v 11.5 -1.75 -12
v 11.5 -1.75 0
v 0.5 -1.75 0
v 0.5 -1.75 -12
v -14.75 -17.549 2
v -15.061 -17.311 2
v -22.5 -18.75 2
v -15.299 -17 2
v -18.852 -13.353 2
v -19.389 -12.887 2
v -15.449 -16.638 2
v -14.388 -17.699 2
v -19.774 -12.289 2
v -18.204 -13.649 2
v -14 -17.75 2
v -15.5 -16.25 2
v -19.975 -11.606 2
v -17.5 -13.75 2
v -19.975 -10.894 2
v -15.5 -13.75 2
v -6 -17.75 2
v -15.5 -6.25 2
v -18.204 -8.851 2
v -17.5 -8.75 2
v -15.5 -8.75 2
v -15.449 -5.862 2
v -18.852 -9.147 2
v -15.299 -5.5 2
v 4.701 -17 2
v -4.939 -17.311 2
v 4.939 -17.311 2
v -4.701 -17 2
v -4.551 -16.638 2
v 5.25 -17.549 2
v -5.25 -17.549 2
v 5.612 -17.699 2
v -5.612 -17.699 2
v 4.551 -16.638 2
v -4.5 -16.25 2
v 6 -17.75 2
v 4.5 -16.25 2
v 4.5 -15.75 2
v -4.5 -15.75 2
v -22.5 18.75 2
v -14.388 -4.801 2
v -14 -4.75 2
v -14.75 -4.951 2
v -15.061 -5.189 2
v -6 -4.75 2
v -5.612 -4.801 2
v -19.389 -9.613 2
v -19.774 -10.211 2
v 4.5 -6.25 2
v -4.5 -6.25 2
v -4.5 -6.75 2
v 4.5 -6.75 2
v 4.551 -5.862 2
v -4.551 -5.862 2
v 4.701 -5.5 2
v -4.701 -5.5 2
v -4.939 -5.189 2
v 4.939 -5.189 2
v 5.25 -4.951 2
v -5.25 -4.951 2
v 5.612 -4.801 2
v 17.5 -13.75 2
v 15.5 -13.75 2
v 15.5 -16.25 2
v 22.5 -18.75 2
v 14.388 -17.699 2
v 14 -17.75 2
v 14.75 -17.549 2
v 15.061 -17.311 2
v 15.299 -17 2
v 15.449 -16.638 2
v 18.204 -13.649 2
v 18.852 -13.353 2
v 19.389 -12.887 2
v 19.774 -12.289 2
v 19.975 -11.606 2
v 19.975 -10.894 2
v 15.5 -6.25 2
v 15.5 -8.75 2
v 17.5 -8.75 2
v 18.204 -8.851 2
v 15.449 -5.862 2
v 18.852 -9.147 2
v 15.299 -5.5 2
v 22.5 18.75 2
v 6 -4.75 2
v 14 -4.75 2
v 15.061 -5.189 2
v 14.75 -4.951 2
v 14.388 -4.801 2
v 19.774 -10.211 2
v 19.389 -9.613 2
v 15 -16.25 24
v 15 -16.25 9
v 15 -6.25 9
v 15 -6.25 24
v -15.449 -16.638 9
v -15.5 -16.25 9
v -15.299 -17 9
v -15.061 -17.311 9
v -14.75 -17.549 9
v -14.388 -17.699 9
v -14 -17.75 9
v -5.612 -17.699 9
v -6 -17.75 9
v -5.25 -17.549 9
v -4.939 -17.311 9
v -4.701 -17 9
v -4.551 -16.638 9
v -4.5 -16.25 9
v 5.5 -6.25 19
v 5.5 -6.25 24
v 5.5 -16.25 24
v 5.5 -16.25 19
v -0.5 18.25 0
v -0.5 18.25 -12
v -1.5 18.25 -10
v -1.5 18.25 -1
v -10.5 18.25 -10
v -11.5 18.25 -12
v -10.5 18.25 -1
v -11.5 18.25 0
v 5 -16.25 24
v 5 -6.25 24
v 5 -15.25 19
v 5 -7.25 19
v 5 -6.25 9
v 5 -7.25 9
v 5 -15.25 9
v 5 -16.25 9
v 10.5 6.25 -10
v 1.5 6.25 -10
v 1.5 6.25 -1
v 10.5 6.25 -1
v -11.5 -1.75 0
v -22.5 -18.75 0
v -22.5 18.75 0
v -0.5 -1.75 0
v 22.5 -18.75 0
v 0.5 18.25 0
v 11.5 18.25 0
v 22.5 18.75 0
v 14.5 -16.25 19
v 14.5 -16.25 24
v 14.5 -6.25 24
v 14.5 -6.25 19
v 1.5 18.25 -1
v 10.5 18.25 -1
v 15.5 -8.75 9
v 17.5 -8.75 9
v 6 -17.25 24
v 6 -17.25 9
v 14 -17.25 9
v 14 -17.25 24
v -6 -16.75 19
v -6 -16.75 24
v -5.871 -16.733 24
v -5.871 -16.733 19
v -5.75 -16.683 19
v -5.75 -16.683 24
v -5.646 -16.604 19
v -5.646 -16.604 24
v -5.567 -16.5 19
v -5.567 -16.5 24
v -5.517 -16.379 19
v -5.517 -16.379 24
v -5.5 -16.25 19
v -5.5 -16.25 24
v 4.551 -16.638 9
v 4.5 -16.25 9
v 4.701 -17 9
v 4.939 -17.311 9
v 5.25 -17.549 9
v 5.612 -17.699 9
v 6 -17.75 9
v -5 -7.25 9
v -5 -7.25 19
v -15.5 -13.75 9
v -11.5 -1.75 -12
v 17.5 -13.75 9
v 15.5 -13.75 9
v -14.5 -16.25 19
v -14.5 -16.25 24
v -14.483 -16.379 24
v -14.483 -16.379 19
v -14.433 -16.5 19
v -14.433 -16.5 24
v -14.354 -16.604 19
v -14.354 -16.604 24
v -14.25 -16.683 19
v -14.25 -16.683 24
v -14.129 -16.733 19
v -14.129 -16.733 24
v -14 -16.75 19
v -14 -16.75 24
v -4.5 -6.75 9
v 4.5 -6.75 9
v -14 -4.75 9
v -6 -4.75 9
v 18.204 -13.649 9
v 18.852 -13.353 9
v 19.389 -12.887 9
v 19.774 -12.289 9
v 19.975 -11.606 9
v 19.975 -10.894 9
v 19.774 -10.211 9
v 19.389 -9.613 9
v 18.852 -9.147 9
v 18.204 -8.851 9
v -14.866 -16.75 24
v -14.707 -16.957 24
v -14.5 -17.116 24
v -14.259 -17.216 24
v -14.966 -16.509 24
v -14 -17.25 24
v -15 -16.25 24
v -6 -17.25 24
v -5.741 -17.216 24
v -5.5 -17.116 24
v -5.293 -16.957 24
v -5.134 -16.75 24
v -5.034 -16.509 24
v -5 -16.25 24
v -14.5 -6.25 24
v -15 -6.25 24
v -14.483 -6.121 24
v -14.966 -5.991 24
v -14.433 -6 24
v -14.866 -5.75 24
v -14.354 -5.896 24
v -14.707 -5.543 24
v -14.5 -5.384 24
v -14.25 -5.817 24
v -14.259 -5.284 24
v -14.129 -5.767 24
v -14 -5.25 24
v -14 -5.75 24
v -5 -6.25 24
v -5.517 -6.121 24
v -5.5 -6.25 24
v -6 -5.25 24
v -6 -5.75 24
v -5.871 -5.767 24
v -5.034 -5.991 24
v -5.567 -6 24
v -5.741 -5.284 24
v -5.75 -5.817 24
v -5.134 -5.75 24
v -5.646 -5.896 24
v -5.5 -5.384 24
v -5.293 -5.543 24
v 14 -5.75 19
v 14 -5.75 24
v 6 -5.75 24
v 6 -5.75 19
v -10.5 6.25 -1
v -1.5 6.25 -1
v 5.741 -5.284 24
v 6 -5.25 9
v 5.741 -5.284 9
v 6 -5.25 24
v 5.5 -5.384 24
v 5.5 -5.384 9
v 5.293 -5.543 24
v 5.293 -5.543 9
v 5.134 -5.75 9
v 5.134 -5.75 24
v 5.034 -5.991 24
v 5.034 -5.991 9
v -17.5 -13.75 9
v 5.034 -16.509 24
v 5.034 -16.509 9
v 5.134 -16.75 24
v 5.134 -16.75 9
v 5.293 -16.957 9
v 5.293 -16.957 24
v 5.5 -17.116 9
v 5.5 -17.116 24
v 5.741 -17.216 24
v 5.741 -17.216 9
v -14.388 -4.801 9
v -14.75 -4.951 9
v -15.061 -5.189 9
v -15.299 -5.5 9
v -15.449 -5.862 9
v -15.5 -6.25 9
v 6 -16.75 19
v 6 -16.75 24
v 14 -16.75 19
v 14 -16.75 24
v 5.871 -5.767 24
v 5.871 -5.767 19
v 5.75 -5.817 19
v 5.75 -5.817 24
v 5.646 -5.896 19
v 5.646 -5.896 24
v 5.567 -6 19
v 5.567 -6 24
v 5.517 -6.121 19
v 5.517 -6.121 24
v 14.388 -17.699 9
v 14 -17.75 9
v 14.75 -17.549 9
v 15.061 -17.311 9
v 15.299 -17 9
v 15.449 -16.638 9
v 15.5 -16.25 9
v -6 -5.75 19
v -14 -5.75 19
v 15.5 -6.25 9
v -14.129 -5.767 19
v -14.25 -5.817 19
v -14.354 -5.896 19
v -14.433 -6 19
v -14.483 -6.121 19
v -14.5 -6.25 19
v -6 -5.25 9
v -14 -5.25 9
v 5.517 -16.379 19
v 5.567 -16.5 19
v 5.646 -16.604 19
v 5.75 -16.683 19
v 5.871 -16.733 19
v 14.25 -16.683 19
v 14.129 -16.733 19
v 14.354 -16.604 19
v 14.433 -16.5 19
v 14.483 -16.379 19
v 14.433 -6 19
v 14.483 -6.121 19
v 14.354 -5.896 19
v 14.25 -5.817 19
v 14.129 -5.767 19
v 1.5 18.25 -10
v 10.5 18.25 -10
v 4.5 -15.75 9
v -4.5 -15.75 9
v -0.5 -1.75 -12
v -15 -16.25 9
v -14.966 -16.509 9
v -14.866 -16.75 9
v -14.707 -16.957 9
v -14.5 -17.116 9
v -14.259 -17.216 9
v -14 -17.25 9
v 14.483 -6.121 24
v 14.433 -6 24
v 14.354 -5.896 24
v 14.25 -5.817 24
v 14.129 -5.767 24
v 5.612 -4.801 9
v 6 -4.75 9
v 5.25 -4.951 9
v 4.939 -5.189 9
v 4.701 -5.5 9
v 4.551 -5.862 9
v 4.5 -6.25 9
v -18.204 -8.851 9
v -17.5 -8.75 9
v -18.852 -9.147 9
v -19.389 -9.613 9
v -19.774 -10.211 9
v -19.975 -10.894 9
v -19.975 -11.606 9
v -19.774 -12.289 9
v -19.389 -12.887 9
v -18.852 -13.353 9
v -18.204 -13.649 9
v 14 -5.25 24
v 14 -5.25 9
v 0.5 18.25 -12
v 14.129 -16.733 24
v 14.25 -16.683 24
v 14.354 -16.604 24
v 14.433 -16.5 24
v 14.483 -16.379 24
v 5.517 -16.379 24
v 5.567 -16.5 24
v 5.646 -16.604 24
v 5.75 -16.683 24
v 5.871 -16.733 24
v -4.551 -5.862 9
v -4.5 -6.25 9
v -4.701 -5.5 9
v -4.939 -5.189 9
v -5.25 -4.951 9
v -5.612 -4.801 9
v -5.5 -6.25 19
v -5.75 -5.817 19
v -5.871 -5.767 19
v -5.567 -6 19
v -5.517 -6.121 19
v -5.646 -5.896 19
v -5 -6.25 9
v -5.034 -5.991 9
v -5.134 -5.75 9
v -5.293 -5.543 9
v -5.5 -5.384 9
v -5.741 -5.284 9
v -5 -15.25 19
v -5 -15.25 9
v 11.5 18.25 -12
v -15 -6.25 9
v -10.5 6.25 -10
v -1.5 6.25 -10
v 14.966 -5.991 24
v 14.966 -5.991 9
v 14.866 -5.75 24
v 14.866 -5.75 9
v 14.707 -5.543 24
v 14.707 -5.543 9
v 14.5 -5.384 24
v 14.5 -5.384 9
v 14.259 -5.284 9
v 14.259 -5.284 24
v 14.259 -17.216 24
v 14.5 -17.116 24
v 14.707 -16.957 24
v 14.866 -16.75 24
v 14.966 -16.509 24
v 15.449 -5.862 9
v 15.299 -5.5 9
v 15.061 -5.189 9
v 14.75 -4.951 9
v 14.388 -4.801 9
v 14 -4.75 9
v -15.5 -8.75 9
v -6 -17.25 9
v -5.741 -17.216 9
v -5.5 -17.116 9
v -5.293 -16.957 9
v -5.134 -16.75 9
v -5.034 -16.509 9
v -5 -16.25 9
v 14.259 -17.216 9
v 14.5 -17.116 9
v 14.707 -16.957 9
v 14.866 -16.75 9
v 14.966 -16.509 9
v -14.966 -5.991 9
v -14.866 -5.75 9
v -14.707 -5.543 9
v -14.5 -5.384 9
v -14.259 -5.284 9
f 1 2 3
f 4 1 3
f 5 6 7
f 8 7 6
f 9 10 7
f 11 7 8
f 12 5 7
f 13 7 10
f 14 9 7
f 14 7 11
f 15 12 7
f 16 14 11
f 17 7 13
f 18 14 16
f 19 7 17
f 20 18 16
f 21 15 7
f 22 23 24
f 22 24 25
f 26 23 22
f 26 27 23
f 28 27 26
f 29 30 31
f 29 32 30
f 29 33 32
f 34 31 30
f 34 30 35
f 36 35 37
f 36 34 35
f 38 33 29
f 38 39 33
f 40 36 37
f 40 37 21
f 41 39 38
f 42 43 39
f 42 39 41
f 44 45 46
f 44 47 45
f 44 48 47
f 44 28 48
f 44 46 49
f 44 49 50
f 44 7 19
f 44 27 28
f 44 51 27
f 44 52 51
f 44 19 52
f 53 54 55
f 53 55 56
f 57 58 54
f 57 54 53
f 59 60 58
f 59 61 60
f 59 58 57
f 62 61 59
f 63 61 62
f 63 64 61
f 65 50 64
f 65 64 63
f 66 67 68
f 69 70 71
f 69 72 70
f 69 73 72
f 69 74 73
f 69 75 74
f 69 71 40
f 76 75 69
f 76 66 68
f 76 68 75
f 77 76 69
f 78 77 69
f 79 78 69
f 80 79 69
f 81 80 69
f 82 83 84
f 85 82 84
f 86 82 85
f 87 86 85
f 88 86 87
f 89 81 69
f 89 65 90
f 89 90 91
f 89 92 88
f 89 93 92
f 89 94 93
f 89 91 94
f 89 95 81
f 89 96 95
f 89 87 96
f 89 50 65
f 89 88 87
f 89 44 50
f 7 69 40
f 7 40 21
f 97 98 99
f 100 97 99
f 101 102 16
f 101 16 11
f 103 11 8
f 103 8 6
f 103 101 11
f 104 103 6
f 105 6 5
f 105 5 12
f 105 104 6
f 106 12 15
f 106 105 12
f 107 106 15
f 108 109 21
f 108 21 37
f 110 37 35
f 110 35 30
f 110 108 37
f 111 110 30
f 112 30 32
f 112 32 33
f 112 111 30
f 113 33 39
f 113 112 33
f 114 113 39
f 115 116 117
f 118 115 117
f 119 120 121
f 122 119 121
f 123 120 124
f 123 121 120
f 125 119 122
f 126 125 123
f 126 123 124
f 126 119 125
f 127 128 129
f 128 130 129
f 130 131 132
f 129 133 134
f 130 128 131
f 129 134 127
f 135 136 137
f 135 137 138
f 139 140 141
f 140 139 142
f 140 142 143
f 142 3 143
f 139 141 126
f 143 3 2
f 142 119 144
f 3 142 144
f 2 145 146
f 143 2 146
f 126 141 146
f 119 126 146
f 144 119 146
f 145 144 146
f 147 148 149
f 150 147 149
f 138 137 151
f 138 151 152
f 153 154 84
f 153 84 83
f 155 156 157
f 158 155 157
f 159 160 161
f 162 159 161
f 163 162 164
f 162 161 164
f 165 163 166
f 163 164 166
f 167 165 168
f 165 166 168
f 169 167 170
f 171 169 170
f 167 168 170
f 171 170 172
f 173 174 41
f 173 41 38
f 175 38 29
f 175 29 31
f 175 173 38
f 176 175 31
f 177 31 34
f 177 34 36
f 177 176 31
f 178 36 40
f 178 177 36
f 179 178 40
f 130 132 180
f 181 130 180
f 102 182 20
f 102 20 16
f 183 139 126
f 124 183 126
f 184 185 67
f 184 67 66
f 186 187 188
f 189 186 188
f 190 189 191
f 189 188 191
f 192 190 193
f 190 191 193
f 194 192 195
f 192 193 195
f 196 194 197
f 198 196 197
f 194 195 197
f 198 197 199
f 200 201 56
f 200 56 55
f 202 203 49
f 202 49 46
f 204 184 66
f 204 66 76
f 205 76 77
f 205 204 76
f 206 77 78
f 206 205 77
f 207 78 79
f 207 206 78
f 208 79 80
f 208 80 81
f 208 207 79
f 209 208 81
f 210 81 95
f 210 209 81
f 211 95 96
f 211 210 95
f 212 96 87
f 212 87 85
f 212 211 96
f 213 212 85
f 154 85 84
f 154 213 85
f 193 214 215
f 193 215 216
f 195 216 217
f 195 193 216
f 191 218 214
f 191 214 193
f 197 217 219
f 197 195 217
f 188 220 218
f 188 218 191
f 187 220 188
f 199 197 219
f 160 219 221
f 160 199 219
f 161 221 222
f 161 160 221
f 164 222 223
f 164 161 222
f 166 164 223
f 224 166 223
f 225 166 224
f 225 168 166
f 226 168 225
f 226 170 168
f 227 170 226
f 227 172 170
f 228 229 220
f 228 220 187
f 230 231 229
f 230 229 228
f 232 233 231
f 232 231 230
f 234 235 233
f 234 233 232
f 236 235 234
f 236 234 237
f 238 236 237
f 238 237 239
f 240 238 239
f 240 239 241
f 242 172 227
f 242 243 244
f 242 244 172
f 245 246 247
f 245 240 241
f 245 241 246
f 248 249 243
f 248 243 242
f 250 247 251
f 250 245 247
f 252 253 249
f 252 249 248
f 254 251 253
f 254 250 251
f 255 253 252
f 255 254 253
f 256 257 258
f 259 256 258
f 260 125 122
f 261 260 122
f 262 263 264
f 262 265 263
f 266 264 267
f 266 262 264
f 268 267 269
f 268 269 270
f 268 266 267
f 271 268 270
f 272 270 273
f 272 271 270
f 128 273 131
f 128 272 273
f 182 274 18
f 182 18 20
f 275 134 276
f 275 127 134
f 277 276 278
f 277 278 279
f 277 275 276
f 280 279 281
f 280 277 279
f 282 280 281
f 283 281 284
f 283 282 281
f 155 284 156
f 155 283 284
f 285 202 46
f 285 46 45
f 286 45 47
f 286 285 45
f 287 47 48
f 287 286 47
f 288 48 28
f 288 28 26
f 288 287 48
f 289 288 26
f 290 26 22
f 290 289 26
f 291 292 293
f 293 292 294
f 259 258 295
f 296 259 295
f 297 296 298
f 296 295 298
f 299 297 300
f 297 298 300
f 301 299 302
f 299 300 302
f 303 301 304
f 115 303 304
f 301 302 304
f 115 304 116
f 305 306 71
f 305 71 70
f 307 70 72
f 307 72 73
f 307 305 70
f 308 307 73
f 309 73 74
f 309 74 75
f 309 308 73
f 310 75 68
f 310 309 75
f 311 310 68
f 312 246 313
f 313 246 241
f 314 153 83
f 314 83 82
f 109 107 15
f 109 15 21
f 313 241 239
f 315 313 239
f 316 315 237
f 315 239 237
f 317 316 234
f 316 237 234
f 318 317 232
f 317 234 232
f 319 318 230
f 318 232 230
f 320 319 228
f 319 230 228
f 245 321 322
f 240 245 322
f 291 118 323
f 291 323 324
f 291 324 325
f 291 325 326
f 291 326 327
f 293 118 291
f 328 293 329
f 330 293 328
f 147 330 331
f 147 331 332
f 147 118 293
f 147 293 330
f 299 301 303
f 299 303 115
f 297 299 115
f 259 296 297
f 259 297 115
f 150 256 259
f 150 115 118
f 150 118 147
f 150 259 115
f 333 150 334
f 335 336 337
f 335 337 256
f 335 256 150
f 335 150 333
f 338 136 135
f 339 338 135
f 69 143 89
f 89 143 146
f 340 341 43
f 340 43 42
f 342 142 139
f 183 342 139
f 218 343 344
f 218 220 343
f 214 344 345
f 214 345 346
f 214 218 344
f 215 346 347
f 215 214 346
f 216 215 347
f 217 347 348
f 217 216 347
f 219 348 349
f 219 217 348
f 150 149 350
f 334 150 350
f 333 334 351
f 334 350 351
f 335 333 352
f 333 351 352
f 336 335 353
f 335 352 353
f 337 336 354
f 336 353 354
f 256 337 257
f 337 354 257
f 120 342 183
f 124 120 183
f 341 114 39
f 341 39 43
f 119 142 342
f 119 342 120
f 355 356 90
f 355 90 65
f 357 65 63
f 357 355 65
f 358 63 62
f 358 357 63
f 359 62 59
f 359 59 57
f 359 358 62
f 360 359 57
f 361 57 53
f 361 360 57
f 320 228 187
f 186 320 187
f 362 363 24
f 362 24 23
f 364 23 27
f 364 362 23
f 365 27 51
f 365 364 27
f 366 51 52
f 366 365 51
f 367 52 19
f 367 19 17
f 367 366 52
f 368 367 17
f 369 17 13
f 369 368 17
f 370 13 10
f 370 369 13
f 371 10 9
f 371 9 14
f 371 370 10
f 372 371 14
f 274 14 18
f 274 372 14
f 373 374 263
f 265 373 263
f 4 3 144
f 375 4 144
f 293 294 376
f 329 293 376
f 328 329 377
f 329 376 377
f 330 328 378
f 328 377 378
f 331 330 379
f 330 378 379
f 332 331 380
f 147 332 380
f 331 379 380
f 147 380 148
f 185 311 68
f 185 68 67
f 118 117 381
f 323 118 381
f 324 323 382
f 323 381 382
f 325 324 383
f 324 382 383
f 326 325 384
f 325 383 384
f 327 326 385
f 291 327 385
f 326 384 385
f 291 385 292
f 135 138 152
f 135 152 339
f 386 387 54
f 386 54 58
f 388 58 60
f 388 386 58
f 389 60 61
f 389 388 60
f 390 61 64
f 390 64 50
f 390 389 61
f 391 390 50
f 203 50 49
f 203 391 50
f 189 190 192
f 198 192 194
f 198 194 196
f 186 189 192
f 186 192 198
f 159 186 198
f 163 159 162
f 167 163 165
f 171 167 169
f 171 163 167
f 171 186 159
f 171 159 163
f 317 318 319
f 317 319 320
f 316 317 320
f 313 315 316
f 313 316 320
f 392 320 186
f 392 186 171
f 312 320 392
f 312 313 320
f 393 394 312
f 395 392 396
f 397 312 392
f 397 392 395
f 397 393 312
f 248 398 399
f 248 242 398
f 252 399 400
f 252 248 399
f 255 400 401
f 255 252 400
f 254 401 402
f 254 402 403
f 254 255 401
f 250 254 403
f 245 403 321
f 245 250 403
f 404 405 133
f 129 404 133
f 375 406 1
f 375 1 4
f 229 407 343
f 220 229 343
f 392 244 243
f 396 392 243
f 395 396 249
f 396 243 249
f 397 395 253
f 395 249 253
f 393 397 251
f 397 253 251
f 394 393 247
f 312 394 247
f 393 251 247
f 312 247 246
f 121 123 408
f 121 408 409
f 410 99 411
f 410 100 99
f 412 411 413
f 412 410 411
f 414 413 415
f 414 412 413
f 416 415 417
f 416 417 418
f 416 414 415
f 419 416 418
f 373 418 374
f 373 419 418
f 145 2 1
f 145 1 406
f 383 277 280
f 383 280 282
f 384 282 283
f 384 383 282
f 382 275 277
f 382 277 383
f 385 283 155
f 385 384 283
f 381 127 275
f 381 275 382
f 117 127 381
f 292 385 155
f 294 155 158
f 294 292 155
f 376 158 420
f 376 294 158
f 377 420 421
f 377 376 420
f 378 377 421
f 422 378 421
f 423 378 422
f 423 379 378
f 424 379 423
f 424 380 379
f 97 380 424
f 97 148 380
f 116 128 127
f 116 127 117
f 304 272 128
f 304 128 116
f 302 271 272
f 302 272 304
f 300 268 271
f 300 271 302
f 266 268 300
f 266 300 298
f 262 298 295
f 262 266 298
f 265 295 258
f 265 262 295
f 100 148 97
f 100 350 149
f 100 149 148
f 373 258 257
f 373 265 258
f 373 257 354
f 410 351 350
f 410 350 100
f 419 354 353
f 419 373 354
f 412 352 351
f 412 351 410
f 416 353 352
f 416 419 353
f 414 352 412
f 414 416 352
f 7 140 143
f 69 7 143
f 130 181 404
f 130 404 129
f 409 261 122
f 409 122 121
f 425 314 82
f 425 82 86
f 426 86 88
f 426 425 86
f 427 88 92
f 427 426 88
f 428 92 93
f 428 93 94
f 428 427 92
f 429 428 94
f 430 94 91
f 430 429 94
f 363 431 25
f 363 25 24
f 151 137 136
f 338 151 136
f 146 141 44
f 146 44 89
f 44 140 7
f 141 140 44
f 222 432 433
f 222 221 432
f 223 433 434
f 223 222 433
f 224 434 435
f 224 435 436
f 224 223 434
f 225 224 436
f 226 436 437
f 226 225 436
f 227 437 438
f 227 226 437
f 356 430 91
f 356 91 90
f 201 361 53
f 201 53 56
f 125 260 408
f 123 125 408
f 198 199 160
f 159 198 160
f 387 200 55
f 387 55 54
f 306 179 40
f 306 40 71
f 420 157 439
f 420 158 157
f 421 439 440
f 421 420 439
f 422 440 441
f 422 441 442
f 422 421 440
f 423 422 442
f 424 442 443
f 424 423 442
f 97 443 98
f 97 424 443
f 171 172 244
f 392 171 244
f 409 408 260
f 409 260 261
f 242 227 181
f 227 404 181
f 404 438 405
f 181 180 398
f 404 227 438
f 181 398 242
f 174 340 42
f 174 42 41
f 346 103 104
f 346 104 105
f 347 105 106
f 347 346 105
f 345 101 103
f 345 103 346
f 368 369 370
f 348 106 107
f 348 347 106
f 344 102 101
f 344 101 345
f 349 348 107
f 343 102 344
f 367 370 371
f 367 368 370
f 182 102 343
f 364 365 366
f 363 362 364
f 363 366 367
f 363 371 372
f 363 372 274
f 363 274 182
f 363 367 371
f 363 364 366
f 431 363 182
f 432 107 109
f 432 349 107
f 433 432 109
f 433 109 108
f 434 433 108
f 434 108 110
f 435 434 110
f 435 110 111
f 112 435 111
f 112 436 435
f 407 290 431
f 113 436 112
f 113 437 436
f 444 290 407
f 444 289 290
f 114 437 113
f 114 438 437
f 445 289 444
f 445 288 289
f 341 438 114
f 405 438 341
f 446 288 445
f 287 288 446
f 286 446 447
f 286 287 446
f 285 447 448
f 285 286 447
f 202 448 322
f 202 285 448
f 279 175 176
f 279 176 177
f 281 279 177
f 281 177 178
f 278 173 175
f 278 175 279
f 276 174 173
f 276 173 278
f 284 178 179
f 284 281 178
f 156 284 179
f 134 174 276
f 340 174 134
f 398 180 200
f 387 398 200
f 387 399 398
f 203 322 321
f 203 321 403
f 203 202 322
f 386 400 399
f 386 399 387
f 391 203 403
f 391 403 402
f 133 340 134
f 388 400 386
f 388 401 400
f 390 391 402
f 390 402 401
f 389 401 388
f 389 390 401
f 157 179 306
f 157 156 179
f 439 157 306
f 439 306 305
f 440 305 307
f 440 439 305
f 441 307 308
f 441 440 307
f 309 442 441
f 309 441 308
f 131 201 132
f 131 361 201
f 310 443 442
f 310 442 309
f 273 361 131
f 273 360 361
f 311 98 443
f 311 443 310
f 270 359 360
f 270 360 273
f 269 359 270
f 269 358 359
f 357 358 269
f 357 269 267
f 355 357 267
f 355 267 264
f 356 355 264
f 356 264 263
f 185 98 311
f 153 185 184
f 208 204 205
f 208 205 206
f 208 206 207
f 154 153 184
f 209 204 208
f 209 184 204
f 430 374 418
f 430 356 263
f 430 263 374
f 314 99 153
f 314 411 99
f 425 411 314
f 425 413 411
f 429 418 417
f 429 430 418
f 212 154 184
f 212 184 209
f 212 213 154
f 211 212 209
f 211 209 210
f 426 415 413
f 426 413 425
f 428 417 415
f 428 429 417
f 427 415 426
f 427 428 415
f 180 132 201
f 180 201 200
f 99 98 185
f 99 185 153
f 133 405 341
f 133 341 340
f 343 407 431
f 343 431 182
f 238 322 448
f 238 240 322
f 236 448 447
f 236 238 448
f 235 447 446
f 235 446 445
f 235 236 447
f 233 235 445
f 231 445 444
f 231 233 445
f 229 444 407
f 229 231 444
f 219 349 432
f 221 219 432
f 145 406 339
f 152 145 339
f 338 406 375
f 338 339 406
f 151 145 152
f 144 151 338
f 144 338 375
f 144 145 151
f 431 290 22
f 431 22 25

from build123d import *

# Parameters (mm, degrees)
SKETCH1_W           = 45
SKETCH1_H           = 37.5
BOSS_EXTRUDE1_DEPTH = 2
SKETCH2_W           = 40
SKETCH2_H           = 13
BOSS_EXTRUDE2_DEPTH = 7
BOSS_EXTRUDE3_DEPTH = 15
FILLET1_R           = 1
SKETCH4_W           = 10
SKETCH4_H           = 8
CUT_EXTRUDE1_DEPTH  = 5
SKETCH5_W           = 41
SKETCH5_H           = 14
CUT_EXTRUDE2_DEPTH  = 7
SKETCH6_W           = 11
SKETCH6_H           = 20
BOSS_EXTRUDE5_DEPTH = 12
SKETCH7_W           = 9
SKETCH7_H           = 9
CUT_EXTRUDE3_DEPTH  = 12


with BuildPart() as part:
    # Sketch1 → Boss-Extrude1 (new body)
    with BuildSketch(Plane.XY):
        Rectangle(SKETCH1_W, SKETCH1_H)
    extrude(amount=BOSS_EXTRUDE1_DEPTH)

    # Sketch2 → Boss-Extrude2 (add)
    with BuildSketch(Plane.XY.offset(2)):
        with Locations((0, -11.25)):
            Rectangle(SKETCH2_W, SKETCH2_H)
    extrude(amount=BOSS_EXTRUDE2_DEPTH)

    # Sketch3 → Boss-Extrude3 (add)
    with BuildSketch(Plane.XY.offset(9)):
        Polygon((-5, -7.25), (-5, -5.25), (-15, -5.25), (-15, -17.25), (-5, -17.25), (-5, -15.25), (5, -15.25), (5, -17.25), (15, -17.25), (15, -5.25), (5, -5.25), (5, -7.25), align=None)
    extrude(amount=BOSS_EXTRUDE3_DEPTH)

    # Fillet1
    fillet1_edges = [part.edges().sort_by_distance(p)[0] for p in [
        (5, -5.25, 16.5),
        (-5, -5.25, 16.5),
        (-15, -5.25, 16.5),
        (-15, -17.25, 16.5),
        (-5, -17.25, 16.5),
        (5, -17.25, 16.5),
        (15, -17.25, 16.5),
        (15, -5.25, 16.5),
    ]]
    fillet(fillet1_edges, radius=FILLET1_R)

    # Sketch4 → Cut-Extrude1 (cut)
    with BuildSketch(Plane.XY.offset(24)):
        with BuildLine():
            Line((-5.5, -14.75), (-5.5, -7.75))
            Line((-5.5, -7.75), (-5.5, -6.25))
            ThreePointArc((-5.5, -6.25), (-5.646446609, -5.896446609), (-6, -5.75))
            Line((-6, -5.75), (-14, -5.75))
            ThreePointArc((-14, -5.75), (-14.353553391, -5.896446609), (-14.5, -6.25))
            Line((-14.5, -6.25), (-14.5, -16.25))
            ThreePointArc((-14.5, -16.25), (-14.353553391, -16.603553391), (-14, -16.75))
            Line((-14, -16.75), (-6, -16.75))
            ThreePointArc((-6, -16.75), (-5.646446609, -16.603553391), (-5.5, -16.25))
            Line((-5.5, -16.25), (-5.5, -14.75))
        make_face()
        with BuildLine():
            Line((5.5, -7.75), (5.5, -14.75))
            Line((5.5, -14.75), (5.5, -16.25))
            ThreePointArc((5.5, -16.25), (5.646446609, -16.603553391), (6, -16.75))
            Line((6, -16.75), (14, -16.75))
            ThreePointArc((14, -16.75), (14.353553391, -16.603553391), (14.5, -16.25))
            Line((14.5, -16.25), (14.5, -6.25))
            ThreePointArc((14.5, -6.25), (14.353553391, -5.896446609), (14, -5.75))
            Line((14, -5.75), (6, -5.75))
            ThreePointArc((6, -5.75), (5.646446609, -5.896446609), (5.5, -6.25))
            Line((5.5, -6.25), (5.5, -7.75))
        make_face()
        with Locations((0, -11.25)):
            Rectangle(SKETCH4_W, SKETCH4_H)
    extrude(amount=-CUT_EXTRUDE1_DEPTH, mode=Mode.SUBTRACT)

    # Sketch5 → Cut-Extrude2 (cut)
    with BuildSketch(Plane.XY.offset(9)):
        with Locations((0, -11.25)):
            Rectangle(SKETCH5_W, SKETCH5_H)
        with BuildLine():
            Line((-14, -17.75), (-6, -17.75))
            ThreePointArc((-6, -17.75), (-4.939339828, -17.310660172), (-4.5, -16.25))
            Line((-4.5, -16.25), (-4.5, -15.75))
            Line((-4.5, -15.75), (4.5, -15.75))
            Line((4.5, -15.75), (4.5, -16.25))
            ThreePointArc((4.5, -16.25), (4.939339828, -17.310660172), (6, -17.75))
            Line((6, -17.75), (14, -17.75))
            ThreePointArc((14, -17.75), (15.060660172, -17.310660172), (15.5, -16.25))
            Line((15.5, -16.25), (15.5, -13.75))
            Line((15.5, -13.75), (17.5, -13.75))
            ThreePointArc((17.5, -13.75), (20, -11.25), (17.5, -8.75))
            Line((17.5, -8.75), (15.5, -8.75))
            Line((15.5, -8.75), (15.5, -6.25))
            ThreePointArc((15.5, -6.25), (15.060660172, -5.189339828), (14, -4.75))
            Line((14, -4.75), (6, -4.75))
            ThreePointArc((6, -4.75), (4.939339828, -5.189339828), (4.5, -6.25))
            Line((4.5, -6.25), (4.5, -6.75))
            Line((4.5, -6.75), (-4.5, -6.75))
            Line((-4.5, -6.75), (-4.5, -6.25))
            ThreePointArc((-4.5, -6.25), (-4.939339828, -5.189339828), (-6, -4.75))
            Line((-6, -4.75), (-14, -4.75))
            ThreePointArc((-14, -4.75), (-15.060660172, -5.189339828), (-15.5, -6.25))
            Line((-15.5, -6.25), (-15.5, -8.75))
            Line((-15.5, -8.75), (-17.5, -8.75))
            ThreePointArc((-17.5, -8.75), (-20, -11.25), (-17.5, -13.75))
            Line((-17.5, -13.75), (-15.5, -13.75))
            Line((-15.5, -13.75), (-15.5, -16.25))
            ThreePointArc((-15.5, -16.25), (-15.060660172, -17.310660172), (-14, -17.75))
        make_face(mode=Mode.SUBTRACT)
    extrude(amount=-CUT_EXTRUDE2_DEPTH, mode=Mode.SUBTRACT)

    # Sketch6 → Boss-Extrude5 (add)
    with BuildSketch(Plane(origin=(0, 0, 0), x_dir=(-1, 0, 0), z_dir=(0, 0, -1))):
        with Locations((-6, 8.25)):
            Rectangle(SKETCH6_W, SKETCH6_H)
        with Locations((6, 8.25)):
            Rectangle(SKETCH6_W, SKETCH6_H)
    extrude(amount=BOSS_EXTRUDE5_DEPTH)

    # Sketch7 → Cut-Extrude3 (cut)
    with BuildSketch(Plane(origin=(0, 18.25, 0), x_dir=(1, 0, 0), z_dir=(0, 1, 0))):
        with Locations((-6, 5.5)):
            Rectangle(SKETCH7_W, SKETCH7_H)
        with Locations((6, 5.5)):
            Rectangle(SKETCH7_W, SKETCH7_H)
    extrude(amount=-CUT_EXTRUDE3_DEPTH, mode=Mode.SUBTRACT)


solid = part.part
